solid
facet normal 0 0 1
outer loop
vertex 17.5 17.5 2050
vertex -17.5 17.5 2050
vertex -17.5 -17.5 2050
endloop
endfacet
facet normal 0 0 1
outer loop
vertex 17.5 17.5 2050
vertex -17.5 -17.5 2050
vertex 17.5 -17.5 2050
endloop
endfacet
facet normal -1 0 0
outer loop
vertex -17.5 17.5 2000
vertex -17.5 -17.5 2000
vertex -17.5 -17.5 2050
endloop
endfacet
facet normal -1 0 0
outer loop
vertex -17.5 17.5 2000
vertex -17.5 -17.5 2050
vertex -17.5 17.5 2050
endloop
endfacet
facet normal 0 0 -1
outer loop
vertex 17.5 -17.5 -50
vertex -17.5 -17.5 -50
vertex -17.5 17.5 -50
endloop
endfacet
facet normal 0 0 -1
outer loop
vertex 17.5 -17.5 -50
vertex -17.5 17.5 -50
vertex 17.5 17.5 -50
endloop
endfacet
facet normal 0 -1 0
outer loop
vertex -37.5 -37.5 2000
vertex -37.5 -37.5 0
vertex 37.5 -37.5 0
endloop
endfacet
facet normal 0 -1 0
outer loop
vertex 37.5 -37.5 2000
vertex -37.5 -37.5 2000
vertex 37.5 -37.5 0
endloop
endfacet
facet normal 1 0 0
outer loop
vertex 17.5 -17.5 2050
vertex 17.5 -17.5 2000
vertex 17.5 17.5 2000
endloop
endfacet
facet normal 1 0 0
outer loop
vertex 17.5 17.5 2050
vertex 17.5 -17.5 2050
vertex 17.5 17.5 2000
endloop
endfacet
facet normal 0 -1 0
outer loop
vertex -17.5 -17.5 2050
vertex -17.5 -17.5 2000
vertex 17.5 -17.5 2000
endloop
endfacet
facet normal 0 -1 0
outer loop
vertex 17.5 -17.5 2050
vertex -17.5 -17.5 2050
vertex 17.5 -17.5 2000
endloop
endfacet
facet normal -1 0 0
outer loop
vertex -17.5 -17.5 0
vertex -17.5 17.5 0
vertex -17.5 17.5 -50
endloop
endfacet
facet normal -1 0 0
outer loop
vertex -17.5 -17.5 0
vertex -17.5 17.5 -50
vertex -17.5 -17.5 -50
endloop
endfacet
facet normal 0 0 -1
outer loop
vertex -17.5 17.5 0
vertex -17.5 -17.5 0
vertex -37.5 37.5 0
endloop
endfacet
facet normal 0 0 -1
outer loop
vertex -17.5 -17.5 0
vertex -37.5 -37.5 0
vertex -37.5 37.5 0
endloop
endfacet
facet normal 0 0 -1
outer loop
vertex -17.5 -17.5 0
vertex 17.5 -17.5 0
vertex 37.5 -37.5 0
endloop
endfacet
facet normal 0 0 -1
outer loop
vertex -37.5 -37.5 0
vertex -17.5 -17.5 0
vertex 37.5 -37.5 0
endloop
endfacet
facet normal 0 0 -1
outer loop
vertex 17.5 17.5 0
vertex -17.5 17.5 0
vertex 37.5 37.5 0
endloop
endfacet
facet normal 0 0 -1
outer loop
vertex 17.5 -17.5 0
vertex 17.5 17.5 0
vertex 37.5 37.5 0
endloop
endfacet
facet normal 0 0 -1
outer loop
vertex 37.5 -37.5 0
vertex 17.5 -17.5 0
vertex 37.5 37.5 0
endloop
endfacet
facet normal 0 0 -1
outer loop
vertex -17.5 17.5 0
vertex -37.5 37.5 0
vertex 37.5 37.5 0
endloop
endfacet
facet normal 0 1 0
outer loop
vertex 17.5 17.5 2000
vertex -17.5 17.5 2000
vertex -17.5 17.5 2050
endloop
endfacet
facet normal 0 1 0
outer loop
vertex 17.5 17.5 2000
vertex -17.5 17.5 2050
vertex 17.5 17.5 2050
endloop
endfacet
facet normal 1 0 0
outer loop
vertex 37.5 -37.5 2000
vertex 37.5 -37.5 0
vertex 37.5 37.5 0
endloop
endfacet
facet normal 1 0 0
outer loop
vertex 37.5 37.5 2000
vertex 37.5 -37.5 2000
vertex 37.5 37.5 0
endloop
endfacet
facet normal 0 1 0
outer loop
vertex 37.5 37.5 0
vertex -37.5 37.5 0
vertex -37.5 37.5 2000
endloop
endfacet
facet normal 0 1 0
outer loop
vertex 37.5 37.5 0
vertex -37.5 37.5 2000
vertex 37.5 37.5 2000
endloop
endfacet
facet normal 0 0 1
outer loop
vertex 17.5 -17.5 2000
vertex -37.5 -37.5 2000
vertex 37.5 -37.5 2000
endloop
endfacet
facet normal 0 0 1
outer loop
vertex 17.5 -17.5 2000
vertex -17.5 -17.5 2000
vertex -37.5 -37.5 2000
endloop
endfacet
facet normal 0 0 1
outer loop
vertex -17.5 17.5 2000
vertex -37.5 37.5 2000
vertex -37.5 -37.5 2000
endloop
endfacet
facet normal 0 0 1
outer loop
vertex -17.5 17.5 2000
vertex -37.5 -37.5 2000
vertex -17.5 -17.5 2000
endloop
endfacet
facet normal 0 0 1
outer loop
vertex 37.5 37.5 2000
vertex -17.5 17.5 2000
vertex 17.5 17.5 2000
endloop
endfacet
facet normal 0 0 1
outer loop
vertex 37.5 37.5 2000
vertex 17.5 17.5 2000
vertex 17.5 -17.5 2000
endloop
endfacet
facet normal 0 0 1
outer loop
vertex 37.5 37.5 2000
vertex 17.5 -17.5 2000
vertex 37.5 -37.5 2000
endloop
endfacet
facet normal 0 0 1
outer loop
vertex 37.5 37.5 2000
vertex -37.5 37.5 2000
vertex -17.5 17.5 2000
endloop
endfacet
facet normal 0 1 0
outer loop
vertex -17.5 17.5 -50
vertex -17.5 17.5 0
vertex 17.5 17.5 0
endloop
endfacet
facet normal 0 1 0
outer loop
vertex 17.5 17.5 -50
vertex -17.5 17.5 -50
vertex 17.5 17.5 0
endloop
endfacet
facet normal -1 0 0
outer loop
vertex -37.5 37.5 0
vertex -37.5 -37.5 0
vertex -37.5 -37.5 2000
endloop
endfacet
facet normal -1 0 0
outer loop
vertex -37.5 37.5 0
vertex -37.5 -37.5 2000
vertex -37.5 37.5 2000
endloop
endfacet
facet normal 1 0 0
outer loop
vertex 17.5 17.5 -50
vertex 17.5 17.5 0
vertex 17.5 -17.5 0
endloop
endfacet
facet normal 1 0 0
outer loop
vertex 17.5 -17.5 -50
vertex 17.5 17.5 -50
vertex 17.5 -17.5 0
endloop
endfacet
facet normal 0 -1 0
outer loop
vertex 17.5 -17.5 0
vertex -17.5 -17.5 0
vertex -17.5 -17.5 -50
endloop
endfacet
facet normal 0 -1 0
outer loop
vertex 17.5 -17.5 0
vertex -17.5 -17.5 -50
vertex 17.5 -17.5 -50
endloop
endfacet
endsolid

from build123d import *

# Parameters (mm, degrees)
F0_W     = 75
F0_H     = 75
F1_DEPTH = 2000
F2_W     = 35
F2_H     = 35
F4_DEPTH = 50
F3_W     = 35
F3_H     = 35
F5_DEPTH = 50


with BuildPart() as f1:
    # F0 (on Top) → F1 (new body)
    with BuildSketch(Plane.XY):
        Rectangle(F0_W, F0_H)
    extrude(amount=F1_DEPTH)

    # F2 (on face) → F4 (join)
    with BuildSketch(Plane(origin=(0, 0, 0), x_dir=(1, 0, 0), z_dir=(0, 0, -1))):
        Rectangle(F2_W, F2_H)
    extrude(amount=F4_DEPTH)

    # F3 (on face) → F5 (join)
    with BuildSketch(Plane.XY.offset(2000)):
        Rectangle(F3_W, F3_H)
    extrude(amount=F5_DEPTH)


solid = f1.part
